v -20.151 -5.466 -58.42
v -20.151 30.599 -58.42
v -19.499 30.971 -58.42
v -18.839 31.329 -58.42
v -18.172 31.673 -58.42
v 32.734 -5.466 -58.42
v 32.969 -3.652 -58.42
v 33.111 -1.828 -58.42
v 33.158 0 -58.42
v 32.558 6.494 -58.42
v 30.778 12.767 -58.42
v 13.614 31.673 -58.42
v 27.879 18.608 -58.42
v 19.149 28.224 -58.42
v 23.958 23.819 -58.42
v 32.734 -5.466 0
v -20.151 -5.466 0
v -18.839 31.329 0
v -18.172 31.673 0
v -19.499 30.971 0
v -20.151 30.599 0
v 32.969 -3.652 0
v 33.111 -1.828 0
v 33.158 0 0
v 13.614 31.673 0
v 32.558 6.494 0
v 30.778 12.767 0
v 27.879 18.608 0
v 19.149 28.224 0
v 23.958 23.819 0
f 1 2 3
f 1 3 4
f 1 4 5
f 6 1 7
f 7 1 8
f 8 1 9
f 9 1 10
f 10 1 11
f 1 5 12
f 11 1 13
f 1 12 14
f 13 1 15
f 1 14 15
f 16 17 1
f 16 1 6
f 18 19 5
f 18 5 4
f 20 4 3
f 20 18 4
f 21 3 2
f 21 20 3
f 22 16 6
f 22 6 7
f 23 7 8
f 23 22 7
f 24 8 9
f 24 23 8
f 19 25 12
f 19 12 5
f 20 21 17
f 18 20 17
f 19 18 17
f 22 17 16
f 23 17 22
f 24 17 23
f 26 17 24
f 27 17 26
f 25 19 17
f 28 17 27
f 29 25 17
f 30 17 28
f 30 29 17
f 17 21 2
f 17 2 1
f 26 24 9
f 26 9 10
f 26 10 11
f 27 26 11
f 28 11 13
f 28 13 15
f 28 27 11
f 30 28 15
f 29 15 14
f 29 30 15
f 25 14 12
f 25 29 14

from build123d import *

# Parameters (mm, degrees)
F1_DEPTH = 58.42


with BuildPart() as f1:
    # F0 (on Top) → F1 (new body)
    with BuildSketch(Plane.XY):
        with BuildLine():
            Line((-20.150693, -5.465834), (32.733693, -5.465834))
            ThreePointArc((32.733693, -5.465834), (33.051588, -2.74113), (33.157765, 0))
            ThreePointArc((33.157765, 0), (27.878729, 18.608382), (13.614477, 31.672504))
            Line((13.614477, 31.672504), (-18.171751, 31.672504))
            ThreePointArc((-18.171751, 31.672504), (-19.169745, 31.15171), (-20.150693, 30.59948))
            Line((-20.150693, 30.59948), (-20.150693, -5.465834))
        make_face()
    extrude(amount=-F1_DEPTH)


solid = f1.part
